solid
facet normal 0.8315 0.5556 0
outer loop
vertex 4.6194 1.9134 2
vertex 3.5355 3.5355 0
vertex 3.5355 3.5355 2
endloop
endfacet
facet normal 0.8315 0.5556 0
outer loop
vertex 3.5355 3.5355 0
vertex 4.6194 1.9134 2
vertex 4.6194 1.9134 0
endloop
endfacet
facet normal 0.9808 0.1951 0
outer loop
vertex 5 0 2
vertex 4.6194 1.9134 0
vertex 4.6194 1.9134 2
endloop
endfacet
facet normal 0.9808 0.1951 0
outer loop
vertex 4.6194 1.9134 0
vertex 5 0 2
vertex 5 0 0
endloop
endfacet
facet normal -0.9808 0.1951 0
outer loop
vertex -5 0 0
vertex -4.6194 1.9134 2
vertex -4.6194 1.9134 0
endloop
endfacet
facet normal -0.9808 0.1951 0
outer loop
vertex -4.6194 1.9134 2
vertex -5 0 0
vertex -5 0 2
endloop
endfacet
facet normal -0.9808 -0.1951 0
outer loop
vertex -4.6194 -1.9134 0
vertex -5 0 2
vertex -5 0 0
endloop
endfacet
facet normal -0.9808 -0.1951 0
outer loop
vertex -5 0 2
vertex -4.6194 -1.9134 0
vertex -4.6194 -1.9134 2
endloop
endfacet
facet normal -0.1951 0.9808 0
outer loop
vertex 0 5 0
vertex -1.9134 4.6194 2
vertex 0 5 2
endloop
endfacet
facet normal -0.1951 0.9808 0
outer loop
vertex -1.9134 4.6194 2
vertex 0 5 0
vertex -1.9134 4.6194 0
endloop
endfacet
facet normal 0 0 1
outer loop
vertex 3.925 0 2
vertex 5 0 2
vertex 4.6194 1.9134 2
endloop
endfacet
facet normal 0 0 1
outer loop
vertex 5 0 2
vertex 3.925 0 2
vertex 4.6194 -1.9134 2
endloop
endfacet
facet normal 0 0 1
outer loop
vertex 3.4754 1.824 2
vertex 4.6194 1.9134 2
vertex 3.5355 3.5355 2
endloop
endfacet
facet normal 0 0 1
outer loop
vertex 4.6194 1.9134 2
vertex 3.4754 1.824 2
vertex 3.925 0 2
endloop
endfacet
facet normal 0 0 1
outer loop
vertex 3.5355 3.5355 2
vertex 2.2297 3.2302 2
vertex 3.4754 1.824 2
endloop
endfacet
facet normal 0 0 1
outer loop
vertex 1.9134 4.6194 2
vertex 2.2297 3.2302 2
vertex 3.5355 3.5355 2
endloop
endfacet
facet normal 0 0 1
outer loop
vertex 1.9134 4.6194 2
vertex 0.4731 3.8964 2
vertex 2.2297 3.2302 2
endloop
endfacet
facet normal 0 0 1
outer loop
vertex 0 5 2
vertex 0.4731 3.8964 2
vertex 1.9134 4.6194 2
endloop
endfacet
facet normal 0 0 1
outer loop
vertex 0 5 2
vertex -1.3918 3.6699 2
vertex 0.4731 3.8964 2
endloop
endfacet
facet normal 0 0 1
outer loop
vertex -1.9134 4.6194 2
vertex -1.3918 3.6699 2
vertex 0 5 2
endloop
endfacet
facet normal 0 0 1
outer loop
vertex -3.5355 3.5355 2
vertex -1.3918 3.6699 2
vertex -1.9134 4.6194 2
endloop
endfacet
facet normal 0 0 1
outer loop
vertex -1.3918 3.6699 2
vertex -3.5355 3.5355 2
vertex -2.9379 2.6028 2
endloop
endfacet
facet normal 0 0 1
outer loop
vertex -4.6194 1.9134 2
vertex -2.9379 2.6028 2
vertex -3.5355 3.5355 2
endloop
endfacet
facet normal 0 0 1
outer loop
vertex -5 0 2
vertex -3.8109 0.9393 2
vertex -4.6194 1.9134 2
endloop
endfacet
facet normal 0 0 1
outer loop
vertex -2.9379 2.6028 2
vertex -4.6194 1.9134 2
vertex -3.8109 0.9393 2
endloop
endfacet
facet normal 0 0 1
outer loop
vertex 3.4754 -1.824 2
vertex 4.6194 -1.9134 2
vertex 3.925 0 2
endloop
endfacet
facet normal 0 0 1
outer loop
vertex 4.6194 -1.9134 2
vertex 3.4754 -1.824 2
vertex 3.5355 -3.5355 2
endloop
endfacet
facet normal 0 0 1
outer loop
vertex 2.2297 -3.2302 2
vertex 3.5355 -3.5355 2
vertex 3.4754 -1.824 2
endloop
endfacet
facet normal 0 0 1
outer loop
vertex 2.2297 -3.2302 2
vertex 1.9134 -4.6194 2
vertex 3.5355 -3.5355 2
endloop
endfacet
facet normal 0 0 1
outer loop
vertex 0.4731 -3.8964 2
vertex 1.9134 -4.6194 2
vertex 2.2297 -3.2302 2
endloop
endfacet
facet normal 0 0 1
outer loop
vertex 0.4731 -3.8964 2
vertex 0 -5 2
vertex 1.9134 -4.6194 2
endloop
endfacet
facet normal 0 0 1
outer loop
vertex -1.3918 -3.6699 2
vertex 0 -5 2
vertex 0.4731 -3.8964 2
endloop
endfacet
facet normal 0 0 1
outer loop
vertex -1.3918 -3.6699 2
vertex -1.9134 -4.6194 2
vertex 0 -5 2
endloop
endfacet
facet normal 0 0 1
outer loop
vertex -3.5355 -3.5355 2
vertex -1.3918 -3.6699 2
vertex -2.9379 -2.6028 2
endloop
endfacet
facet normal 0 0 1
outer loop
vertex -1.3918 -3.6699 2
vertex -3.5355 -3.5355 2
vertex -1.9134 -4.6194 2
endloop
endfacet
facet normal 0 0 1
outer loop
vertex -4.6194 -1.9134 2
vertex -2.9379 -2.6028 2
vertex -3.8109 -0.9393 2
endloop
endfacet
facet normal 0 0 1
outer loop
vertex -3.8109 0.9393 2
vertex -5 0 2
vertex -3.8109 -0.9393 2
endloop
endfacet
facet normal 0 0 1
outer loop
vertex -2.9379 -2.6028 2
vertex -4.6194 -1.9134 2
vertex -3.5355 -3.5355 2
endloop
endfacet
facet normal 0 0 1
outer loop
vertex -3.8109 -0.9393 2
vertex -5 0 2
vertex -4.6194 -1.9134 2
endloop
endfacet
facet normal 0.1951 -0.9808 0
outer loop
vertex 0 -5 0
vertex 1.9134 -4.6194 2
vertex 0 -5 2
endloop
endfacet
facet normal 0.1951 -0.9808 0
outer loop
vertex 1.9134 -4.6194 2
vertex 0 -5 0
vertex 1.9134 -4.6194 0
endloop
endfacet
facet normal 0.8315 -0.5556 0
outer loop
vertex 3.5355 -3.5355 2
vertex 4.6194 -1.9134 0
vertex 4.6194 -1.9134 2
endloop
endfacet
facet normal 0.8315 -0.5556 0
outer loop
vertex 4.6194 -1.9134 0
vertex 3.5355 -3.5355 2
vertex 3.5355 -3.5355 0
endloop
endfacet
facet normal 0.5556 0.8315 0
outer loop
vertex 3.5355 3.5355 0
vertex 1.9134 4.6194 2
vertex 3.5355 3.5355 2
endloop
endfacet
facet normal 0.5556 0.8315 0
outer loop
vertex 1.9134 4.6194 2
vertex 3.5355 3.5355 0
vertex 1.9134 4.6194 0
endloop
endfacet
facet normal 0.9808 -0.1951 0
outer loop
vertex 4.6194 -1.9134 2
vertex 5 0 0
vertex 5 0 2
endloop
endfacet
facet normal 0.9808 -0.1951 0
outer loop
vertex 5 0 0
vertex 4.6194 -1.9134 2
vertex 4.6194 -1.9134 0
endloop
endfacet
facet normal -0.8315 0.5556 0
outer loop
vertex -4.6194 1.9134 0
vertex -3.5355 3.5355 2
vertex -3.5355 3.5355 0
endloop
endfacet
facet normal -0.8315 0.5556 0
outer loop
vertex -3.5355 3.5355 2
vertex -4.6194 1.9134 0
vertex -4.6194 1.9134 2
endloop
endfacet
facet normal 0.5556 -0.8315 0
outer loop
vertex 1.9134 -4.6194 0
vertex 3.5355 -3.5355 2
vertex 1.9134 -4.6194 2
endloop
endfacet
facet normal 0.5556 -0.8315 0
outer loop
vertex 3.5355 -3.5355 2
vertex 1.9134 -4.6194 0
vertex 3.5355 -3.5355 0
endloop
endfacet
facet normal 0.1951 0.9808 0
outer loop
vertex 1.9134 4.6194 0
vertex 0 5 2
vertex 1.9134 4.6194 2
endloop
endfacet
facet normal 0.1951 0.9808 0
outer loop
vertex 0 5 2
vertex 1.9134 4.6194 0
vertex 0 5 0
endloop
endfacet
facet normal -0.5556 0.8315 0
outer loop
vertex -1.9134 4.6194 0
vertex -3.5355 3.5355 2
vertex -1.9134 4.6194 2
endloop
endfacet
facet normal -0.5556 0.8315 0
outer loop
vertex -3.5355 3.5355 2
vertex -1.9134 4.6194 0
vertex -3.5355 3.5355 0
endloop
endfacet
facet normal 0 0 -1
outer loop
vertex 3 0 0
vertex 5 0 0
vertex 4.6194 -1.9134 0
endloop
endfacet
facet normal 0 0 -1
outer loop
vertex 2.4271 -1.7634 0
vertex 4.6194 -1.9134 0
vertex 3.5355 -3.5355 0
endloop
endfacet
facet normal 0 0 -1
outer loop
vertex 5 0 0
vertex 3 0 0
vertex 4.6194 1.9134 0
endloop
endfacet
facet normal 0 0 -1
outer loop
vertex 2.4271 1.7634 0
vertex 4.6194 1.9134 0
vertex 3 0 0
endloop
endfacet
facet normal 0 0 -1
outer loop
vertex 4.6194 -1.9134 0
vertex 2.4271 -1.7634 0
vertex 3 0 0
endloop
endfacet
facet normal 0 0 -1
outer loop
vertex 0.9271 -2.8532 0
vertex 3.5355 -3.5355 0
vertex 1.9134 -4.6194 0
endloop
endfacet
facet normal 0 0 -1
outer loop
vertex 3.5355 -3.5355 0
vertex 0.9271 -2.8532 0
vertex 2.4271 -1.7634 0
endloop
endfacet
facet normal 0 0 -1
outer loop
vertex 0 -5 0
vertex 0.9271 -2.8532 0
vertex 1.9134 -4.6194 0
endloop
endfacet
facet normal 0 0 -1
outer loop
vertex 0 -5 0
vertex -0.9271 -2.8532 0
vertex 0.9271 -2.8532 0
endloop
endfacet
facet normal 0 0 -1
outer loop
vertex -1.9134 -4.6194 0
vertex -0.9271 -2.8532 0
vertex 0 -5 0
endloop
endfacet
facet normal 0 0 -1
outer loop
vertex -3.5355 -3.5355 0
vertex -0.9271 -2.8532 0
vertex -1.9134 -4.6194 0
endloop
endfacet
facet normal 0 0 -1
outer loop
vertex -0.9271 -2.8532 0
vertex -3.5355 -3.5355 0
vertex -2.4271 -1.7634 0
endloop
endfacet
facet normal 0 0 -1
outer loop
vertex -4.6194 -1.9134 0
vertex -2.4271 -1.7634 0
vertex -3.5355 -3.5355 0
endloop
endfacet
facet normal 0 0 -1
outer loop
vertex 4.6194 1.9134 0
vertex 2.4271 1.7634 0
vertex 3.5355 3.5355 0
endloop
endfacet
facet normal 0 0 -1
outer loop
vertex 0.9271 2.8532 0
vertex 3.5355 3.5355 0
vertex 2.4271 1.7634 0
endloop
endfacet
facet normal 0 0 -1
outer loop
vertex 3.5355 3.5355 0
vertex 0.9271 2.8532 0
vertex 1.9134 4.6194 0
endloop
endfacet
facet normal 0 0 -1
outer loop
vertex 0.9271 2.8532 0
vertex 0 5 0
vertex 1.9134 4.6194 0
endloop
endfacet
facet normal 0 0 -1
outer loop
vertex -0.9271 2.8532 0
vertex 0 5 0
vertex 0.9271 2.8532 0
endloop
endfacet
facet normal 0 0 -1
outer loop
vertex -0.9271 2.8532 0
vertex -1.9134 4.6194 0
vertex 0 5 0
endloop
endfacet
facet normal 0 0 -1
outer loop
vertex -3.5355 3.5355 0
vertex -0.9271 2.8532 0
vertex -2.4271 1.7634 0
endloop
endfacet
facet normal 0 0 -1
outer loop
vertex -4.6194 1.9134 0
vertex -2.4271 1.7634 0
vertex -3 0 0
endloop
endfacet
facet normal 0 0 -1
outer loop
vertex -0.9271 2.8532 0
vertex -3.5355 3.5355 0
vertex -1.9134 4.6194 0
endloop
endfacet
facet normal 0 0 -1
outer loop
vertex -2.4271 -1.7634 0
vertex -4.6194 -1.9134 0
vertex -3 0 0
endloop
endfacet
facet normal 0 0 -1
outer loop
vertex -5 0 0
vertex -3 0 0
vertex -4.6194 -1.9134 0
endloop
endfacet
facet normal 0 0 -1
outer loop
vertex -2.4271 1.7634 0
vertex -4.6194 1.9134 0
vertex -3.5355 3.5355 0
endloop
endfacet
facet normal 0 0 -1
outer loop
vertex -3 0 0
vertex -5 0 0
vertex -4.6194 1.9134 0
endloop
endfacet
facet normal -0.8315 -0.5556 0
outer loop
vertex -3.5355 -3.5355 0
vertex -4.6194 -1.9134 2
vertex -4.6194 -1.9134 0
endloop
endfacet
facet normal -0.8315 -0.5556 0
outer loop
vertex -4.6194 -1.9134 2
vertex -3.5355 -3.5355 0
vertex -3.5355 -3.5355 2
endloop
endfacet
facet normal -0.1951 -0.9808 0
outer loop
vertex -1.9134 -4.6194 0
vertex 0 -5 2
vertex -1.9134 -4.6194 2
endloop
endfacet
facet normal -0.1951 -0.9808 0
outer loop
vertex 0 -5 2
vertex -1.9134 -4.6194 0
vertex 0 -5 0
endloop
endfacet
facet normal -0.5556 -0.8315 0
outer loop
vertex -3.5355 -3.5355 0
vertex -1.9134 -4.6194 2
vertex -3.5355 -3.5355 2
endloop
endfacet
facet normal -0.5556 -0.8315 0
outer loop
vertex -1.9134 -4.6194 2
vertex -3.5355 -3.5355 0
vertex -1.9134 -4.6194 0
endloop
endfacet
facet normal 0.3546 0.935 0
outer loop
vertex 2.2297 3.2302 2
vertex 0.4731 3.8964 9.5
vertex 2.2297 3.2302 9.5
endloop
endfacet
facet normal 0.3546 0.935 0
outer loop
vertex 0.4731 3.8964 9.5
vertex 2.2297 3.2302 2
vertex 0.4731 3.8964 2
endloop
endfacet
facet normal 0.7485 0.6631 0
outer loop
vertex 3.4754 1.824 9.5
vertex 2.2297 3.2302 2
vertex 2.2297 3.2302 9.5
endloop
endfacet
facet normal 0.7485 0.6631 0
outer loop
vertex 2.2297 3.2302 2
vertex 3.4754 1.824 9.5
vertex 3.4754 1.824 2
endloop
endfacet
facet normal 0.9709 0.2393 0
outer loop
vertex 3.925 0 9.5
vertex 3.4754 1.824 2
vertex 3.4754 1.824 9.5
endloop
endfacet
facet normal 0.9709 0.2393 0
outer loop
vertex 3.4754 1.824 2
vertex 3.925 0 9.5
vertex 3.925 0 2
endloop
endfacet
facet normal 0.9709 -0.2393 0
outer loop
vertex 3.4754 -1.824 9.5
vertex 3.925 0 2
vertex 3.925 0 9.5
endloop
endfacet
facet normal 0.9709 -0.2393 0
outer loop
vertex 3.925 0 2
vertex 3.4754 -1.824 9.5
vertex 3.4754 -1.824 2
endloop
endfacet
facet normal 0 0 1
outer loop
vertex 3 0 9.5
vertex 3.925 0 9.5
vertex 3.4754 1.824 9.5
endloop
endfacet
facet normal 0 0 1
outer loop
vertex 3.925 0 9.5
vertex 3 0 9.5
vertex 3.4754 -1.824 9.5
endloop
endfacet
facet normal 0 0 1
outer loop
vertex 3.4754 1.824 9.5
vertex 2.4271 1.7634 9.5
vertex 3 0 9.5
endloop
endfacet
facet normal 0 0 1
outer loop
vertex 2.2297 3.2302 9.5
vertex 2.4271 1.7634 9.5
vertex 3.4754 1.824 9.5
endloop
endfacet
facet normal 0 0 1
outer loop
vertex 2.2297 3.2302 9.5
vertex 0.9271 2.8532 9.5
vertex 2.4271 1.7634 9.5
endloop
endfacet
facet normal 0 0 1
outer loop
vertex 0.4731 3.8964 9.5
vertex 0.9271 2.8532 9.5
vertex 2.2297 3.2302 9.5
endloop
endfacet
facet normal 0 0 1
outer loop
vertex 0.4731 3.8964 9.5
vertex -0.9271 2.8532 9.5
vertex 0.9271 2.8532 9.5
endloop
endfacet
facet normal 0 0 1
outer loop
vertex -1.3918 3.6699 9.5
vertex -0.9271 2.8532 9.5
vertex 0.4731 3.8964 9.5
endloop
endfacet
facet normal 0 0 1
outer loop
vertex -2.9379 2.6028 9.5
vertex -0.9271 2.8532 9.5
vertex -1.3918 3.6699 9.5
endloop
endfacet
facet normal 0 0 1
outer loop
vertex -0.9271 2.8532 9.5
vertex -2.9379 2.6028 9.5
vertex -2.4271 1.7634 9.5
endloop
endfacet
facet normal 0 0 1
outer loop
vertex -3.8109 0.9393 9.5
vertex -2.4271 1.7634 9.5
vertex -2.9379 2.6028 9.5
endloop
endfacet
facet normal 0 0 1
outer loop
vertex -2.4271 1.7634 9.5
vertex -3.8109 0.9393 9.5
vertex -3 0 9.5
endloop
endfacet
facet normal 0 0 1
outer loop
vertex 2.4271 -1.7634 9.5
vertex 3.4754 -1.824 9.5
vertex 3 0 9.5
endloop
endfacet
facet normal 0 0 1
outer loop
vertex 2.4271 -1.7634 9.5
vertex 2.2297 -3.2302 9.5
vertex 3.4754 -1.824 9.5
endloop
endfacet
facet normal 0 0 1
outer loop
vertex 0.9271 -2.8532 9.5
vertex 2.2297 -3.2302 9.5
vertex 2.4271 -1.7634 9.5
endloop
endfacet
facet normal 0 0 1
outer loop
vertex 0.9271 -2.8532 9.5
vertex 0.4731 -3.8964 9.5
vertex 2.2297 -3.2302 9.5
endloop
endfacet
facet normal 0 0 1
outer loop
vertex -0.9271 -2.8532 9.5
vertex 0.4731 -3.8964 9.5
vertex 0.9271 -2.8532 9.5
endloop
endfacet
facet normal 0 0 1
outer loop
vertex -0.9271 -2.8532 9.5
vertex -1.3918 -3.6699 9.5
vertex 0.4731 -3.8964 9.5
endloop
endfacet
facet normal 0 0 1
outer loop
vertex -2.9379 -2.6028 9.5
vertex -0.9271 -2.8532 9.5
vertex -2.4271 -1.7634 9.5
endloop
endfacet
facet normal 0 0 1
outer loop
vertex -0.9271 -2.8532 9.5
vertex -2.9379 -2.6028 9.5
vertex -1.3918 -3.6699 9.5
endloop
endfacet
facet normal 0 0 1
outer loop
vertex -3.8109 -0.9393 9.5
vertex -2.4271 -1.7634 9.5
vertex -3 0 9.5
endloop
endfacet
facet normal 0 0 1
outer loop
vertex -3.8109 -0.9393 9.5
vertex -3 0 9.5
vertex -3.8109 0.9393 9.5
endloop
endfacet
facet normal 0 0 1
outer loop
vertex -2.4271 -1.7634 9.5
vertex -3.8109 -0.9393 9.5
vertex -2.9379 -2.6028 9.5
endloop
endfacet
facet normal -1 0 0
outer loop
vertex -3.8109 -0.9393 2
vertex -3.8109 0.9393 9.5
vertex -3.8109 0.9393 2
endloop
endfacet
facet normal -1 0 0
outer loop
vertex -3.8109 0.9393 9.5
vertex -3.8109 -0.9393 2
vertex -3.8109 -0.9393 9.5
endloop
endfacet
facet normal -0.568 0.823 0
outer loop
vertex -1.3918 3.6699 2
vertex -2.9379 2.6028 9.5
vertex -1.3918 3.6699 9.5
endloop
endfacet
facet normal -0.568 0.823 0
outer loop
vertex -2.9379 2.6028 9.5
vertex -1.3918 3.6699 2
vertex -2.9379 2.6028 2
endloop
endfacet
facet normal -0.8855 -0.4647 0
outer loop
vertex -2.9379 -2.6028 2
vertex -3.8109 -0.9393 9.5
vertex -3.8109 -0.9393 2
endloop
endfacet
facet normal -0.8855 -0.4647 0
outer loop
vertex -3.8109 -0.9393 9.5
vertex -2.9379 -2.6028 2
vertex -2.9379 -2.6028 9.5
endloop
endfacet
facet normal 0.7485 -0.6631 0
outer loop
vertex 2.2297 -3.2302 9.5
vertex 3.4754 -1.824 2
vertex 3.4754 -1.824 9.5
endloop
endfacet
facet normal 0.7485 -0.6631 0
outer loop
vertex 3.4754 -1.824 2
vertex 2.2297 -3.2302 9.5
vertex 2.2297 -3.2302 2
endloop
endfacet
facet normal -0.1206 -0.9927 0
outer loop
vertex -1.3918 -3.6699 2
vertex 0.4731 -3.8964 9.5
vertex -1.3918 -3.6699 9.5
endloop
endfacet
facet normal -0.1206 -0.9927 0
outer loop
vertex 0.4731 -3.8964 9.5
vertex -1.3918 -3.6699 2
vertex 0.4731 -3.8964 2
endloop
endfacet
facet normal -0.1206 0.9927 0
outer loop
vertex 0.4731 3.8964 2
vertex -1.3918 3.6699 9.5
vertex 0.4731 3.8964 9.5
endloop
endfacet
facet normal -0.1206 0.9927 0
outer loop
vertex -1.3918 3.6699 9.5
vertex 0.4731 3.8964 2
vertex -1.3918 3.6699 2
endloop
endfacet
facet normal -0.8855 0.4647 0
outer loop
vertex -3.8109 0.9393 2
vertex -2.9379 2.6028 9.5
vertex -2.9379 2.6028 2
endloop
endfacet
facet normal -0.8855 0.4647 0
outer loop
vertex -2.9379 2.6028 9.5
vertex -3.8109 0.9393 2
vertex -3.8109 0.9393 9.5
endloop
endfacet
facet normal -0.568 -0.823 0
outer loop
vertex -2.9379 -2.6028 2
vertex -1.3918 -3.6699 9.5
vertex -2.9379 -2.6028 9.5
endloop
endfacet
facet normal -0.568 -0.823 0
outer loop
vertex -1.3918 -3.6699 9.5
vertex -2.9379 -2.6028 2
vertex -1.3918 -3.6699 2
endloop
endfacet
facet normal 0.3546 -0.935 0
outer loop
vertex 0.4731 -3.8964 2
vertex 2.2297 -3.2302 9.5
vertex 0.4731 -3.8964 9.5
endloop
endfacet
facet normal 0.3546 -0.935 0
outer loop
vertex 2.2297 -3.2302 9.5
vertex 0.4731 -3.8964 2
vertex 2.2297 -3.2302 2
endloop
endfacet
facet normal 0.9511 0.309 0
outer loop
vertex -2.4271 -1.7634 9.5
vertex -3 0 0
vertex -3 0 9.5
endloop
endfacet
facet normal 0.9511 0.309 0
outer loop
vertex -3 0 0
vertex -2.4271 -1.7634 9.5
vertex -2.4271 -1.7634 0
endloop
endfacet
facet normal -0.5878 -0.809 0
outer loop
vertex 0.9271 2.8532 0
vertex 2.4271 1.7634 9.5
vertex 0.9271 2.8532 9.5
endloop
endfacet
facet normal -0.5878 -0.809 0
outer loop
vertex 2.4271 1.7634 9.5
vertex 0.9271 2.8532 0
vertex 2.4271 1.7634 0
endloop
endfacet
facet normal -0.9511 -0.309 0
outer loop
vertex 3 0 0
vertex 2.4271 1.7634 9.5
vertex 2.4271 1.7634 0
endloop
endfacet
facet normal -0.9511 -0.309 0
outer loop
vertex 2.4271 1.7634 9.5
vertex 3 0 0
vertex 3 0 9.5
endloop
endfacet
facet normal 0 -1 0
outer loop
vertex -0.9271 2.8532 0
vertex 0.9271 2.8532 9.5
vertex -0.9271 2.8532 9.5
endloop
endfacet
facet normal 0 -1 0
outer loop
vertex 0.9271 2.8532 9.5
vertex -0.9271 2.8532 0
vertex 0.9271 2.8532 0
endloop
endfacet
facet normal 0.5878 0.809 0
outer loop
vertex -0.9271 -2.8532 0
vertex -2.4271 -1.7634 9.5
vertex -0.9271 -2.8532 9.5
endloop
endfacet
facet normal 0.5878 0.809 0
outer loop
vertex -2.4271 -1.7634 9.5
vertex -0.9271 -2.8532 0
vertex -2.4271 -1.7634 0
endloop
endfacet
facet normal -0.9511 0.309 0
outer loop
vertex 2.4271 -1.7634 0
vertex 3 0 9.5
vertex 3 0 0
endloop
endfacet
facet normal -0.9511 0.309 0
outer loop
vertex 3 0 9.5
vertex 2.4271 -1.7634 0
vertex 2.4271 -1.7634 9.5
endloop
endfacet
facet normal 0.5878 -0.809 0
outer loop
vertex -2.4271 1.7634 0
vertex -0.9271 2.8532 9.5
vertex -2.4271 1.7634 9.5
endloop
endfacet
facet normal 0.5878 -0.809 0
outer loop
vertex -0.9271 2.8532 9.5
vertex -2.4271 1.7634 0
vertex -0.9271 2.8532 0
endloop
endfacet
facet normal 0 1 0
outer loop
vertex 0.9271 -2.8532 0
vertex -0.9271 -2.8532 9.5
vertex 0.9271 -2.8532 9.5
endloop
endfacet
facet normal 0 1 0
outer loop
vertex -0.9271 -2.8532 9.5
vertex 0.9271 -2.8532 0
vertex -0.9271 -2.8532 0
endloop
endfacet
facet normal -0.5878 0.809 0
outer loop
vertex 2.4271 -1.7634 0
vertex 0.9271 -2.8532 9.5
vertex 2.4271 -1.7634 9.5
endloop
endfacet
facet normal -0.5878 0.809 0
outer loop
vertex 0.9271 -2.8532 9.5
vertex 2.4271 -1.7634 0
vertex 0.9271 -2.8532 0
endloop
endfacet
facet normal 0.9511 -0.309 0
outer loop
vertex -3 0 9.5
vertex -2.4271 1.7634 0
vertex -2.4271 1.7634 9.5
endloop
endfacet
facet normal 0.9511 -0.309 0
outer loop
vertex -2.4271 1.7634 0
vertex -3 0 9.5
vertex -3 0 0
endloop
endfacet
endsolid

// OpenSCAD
//Make this slightly larger than actual pen size for a good tolerance
pencil_hole_diameter = 6; 

//make this one slightly smaller than the hole for press fit
adapter_size_diameter = 7.85; 

//Defines how long into the mount the plug goes, about 5-10mm is good for stability
Insert_length = 7.5;

// Use same diameter as in the mount
collar_diameter = 10; 

// Any height will do, about 2mm is good
collar_height = 2;



difference() {
	union() {
		cylinder(h = collar_height, r1 = collar_diameter/2, r2 = collar_diameter/2, center = false);
		translate([0, 0, collar_height]) cylinder(h = Insert_length, r1 = adapter_size_diameter/2, r2 = adapter_size_diameter/2, center = false);
	}
	translate([0, 0, -1]) cylinder(h = (Insert_length+collar_height)+2, r1 = pencil_hole_diameter/2, r2 = pencil_hole_diameter/2, center = false);
}
